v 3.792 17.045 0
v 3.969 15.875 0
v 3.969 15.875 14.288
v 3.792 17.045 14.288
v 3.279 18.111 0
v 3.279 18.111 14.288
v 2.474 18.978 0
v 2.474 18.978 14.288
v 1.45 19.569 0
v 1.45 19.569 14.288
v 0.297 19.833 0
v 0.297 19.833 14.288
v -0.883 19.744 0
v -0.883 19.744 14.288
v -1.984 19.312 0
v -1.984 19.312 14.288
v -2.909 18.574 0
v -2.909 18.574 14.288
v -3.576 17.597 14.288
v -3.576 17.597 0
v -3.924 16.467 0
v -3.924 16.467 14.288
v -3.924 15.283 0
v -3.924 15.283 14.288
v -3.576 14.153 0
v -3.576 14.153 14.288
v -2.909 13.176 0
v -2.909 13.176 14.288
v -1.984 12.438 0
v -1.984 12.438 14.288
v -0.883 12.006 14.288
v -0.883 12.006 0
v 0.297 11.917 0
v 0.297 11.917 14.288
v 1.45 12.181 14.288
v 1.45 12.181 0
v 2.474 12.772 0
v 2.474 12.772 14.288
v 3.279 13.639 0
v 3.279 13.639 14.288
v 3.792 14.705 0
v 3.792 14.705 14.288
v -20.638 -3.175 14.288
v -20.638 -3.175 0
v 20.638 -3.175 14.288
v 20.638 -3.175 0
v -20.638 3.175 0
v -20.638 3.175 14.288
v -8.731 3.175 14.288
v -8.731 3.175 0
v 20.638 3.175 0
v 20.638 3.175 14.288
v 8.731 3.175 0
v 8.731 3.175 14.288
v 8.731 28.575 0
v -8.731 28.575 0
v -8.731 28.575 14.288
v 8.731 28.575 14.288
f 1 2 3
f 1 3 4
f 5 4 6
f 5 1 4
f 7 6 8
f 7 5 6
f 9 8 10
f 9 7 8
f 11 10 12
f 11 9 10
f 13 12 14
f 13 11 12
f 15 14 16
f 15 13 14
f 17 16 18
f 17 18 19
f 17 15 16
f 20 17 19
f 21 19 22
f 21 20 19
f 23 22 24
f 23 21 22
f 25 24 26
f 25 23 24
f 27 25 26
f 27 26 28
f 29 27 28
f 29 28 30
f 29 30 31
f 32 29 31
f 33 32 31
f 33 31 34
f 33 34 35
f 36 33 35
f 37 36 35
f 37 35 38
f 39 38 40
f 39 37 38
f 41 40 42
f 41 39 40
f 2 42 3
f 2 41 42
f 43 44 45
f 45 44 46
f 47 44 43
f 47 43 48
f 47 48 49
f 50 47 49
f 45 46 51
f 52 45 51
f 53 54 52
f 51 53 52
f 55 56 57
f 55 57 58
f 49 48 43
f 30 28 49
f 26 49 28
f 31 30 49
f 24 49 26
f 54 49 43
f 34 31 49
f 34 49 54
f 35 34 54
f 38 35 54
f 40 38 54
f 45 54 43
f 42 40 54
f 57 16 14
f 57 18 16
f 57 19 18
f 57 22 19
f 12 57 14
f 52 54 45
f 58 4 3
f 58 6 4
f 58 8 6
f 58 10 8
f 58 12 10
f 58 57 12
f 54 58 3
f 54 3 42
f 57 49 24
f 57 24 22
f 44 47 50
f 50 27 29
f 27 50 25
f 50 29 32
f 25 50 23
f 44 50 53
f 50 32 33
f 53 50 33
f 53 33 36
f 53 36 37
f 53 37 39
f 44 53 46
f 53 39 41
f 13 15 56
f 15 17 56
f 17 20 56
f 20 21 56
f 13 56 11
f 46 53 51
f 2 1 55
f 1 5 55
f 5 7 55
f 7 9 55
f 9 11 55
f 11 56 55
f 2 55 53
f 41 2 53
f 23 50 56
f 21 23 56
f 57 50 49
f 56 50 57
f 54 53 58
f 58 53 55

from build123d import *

# Parameters (mm, degrees)
SKETCH1_W           = 41.275
SKETCH1_H           = 6.35
SKETCH1_W_2         = 17.4625
SKETCH1_H_2         = 25.4
SKETCH1_R           = 3.96875
BOSS_EXTRUDE1_DEPTH = 14.2875


with BuildPart() as part:
    # Sketch1 → Boss-Extrude1 (new body)
    # profile 1 of 2: a face of its own
    with BuildSketch(Plane.XY):
        Rectangle(SKETCH1_W, SKETCH1_H)
    # profile 2 of 2: a face of its own
    with BuildSketch(Plane.XY):
        with Locations((0, 15.875)):
            Rectangle(SKETCH1_W_2, SKETCH1_H_2)
        with Locations((0, 15.875)):
            Circle(SKETCH1_R, mode=Mode.SUBTRACT)
    extrude(amount=BOSS_EXTRUDE1_DEPTH)


solid = part.part
